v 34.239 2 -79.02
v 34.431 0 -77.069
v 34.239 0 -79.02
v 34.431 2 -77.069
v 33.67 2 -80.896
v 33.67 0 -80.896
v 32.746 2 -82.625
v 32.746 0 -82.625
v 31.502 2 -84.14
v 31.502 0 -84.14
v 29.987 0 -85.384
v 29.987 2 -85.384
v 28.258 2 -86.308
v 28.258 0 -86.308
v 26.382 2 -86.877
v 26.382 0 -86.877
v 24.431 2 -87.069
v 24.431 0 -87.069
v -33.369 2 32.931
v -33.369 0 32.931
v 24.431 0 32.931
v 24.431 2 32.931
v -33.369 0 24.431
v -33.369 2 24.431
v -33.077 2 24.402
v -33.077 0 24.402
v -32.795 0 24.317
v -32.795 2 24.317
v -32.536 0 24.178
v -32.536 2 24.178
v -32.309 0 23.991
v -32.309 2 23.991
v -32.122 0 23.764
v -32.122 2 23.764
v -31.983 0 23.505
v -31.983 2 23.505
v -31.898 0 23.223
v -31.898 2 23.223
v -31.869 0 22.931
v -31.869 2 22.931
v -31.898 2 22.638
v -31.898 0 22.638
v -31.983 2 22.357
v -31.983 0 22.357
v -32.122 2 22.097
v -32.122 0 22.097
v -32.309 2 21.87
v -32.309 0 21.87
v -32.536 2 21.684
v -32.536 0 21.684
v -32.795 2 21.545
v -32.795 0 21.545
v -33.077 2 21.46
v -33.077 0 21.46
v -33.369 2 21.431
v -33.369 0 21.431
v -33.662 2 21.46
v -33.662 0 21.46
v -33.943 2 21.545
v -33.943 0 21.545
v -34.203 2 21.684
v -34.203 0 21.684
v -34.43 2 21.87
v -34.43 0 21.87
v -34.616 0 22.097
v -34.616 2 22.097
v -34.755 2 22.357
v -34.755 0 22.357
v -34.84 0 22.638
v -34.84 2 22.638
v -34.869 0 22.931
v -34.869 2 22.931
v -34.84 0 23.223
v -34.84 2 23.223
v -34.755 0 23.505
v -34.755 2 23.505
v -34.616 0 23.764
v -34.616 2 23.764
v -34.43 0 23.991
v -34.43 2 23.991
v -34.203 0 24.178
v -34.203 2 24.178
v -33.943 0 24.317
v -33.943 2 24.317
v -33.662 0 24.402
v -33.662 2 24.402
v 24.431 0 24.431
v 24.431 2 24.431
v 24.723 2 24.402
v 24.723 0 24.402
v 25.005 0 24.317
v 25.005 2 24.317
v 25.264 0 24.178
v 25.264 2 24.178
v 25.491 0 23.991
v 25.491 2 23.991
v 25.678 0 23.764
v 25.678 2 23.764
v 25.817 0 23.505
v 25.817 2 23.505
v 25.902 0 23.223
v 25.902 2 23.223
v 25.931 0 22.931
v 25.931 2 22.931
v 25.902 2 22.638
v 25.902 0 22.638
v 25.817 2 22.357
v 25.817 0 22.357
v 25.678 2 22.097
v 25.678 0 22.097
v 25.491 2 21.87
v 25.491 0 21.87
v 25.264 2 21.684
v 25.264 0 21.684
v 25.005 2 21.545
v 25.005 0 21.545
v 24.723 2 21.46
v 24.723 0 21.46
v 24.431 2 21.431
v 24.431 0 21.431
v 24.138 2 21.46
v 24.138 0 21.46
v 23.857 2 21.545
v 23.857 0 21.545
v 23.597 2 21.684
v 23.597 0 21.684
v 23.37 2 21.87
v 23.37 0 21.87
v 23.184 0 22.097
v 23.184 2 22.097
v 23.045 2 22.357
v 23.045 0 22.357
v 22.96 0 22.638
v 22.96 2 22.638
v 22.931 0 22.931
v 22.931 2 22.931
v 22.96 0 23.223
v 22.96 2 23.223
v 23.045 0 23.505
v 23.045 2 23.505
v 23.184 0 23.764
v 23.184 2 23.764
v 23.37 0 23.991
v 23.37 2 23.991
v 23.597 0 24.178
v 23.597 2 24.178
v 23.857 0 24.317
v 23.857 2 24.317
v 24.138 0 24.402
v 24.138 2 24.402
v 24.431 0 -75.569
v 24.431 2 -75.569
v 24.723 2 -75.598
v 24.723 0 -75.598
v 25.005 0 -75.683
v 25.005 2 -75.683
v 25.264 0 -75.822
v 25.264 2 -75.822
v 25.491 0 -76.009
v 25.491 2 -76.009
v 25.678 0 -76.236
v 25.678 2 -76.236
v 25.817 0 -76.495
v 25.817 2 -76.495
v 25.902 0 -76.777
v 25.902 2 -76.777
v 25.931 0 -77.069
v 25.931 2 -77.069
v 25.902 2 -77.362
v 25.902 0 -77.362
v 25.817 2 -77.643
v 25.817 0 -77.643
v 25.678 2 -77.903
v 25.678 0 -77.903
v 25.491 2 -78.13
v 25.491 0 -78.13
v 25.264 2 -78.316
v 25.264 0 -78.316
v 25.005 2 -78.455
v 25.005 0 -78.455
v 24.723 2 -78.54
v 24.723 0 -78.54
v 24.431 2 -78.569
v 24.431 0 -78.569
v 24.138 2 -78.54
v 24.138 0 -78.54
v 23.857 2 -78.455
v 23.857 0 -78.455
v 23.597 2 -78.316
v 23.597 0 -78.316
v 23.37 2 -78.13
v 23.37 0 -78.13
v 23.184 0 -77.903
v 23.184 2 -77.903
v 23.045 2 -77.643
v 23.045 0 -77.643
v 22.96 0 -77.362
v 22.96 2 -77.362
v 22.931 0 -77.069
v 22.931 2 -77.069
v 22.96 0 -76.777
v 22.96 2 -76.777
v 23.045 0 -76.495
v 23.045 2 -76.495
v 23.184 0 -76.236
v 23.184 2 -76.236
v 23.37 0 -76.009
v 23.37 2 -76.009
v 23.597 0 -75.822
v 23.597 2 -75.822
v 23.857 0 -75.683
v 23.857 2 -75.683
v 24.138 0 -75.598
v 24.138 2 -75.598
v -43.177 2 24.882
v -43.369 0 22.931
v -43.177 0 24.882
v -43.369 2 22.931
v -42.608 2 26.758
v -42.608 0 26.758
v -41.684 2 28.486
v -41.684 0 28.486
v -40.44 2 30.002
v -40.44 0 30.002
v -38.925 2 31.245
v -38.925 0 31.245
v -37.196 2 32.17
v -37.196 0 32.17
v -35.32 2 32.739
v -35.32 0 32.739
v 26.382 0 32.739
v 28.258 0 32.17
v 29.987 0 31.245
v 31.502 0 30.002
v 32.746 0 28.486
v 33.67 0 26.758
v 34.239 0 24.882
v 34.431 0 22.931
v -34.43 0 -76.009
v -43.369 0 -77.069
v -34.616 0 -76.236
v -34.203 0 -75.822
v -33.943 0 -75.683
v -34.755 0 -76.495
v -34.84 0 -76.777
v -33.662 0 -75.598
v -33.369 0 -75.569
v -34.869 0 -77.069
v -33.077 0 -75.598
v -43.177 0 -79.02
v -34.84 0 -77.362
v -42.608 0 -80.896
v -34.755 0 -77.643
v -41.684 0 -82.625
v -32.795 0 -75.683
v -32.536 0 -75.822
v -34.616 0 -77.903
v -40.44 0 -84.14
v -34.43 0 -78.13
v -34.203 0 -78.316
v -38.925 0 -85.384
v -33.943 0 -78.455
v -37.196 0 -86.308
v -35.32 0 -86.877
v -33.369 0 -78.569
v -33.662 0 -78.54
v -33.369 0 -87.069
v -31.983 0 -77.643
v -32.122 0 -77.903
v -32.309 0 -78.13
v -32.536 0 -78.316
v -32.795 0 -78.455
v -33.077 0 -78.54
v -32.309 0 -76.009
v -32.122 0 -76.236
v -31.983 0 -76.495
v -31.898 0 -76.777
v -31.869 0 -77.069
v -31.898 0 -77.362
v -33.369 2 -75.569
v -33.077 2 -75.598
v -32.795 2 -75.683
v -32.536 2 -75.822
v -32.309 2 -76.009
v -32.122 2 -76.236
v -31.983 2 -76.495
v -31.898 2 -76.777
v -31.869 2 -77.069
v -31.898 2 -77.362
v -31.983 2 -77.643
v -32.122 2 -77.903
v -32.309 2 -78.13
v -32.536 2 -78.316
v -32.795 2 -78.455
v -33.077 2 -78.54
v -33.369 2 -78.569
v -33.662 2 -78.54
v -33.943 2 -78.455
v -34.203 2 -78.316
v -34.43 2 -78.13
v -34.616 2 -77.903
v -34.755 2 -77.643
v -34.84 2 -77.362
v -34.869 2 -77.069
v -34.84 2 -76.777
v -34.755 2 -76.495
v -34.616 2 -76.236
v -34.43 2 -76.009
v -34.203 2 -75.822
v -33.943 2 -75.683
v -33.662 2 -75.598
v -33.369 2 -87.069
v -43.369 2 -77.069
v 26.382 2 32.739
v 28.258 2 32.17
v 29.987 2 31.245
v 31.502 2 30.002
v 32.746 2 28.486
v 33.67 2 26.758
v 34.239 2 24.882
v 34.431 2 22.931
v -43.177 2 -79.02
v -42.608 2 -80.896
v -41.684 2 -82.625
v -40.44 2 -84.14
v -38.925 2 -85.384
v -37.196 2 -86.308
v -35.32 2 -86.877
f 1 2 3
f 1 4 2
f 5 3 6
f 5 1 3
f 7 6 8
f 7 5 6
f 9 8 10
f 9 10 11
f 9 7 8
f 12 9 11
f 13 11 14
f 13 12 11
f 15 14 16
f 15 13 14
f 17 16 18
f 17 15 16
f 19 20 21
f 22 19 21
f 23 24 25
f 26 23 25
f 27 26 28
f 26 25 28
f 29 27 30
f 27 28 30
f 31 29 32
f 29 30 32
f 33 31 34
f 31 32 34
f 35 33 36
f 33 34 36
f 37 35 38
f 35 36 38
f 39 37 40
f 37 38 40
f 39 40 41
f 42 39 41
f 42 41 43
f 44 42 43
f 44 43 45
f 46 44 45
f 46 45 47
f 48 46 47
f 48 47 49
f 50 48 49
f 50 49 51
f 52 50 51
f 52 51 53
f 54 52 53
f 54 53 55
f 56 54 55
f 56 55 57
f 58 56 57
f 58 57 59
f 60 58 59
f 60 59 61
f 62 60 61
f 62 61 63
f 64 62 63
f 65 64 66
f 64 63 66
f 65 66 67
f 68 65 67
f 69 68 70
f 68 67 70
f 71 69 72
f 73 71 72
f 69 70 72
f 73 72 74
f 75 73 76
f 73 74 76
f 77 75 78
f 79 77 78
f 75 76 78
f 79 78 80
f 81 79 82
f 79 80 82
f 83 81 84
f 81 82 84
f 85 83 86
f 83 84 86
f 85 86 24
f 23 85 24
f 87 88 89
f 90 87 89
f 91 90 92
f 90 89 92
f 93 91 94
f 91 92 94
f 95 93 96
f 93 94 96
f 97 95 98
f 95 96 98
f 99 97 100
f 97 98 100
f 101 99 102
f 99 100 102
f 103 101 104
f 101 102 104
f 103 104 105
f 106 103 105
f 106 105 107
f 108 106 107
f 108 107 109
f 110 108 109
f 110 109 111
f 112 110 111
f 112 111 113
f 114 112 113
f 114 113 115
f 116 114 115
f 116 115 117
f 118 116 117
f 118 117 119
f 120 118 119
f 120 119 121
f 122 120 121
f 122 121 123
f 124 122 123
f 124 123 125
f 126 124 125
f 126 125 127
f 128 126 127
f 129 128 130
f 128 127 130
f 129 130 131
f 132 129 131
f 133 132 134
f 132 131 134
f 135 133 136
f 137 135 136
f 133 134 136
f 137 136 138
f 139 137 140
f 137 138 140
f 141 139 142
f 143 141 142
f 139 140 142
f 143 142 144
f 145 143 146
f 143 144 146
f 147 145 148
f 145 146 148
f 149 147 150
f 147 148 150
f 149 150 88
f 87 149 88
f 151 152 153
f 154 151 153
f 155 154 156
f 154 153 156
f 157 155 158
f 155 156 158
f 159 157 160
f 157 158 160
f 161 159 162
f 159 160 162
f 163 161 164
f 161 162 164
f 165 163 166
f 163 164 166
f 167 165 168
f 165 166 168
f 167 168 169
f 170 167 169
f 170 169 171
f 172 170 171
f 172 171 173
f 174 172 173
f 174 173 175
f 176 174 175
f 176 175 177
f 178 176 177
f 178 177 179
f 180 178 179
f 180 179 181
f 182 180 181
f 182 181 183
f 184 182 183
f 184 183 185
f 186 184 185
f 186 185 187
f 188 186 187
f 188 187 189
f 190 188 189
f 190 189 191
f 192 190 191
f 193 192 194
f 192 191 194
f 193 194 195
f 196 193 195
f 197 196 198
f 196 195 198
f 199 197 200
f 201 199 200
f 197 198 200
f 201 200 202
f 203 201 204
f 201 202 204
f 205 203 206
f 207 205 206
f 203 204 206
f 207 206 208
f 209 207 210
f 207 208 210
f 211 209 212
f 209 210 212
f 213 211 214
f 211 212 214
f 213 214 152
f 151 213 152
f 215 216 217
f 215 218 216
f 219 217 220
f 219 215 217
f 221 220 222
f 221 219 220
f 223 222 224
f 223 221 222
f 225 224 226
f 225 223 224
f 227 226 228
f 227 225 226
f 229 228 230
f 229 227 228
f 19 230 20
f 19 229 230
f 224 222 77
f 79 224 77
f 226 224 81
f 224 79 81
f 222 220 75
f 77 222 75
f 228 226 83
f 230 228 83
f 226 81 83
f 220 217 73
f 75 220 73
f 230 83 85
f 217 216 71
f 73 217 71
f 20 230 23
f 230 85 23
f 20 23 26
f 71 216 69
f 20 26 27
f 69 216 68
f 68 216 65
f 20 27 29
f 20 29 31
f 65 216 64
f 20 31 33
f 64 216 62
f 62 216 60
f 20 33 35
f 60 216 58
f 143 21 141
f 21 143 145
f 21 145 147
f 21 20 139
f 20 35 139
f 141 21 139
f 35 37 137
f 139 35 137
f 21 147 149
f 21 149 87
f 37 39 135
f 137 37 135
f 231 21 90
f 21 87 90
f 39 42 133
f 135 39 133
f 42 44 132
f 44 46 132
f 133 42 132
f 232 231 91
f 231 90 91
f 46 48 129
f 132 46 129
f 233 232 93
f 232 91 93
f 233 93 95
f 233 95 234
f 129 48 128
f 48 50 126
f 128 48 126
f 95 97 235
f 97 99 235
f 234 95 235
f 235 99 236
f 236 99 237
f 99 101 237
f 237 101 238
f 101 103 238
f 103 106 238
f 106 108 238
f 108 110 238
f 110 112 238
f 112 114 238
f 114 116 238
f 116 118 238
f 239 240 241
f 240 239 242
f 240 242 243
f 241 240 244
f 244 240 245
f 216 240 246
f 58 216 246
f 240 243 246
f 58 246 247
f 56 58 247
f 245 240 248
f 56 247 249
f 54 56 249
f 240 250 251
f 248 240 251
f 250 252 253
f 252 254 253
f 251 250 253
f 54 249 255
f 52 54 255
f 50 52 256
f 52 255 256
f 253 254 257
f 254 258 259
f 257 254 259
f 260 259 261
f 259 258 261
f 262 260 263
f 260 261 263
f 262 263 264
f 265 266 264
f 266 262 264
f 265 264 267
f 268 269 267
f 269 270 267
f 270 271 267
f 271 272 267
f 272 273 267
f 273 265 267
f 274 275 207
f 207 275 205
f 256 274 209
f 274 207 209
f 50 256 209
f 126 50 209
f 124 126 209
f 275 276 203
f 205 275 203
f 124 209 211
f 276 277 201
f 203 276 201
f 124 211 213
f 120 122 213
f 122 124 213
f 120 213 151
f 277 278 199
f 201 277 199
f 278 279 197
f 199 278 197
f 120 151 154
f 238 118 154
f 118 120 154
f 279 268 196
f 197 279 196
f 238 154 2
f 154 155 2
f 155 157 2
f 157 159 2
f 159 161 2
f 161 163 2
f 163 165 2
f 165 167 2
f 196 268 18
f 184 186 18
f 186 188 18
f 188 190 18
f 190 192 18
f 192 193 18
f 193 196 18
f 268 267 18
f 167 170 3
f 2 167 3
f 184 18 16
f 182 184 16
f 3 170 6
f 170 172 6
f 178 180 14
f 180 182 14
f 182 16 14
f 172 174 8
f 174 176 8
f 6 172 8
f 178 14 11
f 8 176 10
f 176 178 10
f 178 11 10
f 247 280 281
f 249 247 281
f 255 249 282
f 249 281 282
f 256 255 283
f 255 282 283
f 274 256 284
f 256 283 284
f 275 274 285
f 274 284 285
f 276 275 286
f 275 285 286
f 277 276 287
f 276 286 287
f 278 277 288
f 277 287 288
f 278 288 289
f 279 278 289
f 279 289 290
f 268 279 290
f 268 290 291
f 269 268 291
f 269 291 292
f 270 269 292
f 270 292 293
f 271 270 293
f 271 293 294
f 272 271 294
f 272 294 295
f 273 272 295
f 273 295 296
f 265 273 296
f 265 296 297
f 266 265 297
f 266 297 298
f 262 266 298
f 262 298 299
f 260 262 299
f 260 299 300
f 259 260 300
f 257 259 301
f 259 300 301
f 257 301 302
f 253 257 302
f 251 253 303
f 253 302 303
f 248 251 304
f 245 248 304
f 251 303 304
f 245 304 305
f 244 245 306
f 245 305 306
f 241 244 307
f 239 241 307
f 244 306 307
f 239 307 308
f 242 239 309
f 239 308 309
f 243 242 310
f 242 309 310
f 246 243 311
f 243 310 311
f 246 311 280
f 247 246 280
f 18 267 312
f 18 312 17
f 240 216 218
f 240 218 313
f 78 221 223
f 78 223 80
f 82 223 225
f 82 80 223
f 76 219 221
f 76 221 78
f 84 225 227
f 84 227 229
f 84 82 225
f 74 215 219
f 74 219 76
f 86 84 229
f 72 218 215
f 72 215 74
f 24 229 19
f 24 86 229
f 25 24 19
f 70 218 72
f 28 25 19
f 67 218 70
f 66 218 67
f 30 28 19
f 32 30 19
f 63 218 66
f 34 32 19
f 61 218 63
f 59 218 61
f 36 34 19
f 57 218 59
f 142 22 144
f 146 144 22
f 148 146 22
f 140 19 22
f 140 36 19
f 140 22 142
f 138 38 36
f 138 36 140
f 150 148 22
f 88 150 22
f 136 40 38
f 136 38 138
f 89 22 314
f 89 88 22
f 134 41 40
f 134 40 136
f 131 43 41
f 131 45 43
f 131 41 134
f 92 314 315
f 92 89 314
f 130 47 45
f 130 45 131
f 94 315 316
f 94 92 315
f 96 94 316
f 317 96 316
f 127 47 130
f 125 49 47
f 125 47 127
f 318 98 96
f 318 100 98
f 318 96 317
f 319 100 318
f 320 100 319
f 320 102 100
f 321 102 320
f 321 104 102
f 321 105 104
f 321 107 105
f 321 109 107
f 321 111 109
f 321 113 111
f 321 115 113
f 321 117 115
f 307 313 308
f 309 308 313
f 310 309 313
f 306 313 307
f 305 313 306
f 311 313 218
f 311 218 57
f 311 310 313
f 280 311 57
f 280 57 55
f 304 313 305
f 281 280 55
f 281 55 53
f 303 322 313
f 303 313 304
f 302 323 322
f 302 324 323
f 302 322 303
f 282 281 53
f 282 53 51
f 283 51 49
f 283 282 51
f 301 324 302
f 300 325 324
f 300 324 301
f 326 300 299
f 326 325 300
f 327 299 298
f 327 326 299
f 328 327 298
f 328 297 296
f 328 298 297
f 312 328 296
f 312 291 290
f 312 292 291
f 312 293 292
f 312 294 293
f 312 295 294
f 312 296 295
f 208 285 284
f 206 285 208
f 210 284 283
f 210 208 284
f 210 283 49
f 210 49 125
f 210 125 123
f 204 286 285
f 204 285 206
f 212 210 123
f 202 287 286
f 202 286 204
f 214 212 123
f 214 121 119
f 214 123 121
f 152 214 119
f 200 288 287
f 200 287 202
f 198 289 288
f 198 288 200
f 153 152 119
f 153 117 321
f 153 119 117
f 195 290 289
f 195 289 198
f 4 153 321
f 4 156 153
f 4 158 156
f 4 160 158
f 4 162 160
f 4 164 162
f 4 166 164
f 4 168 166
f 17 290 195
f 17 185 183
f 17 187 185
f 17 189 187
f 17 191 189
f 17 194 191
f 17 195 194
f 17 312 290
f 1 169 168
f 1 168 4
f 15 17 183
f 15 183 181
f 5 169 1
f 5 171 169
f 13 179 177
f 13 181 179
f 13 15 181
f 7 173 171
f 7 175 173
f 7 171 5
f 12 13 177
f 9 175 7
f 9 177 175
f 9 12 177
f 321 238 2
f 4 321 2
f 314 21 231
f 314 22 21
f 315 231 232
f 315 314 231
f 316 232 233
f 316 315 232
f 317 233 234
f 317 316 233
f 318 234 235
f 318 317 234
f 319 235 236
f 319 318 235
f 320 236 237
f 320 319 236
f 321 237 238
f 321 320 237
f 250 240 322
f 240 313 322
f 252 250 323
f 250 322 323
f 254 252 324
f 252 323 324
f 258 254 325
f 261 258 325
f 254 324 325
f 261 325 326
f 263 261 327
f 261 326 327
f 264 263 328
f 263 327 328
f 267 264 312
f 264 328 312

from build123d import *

# Parameters (mm, degrees)
SKETCH1_W           = 77.8
SKETCH1_H           = 120
BOSS_EXTRUDE1_DEPTH = 2
FILLET1_R           = 10
SKETCH2_R           = 1.5
CUT_EXTRUDE1_DEPTH  = 21


with BuildPart() as part:
    # Sketch1 → Boss-Extrude1 (new body)
    with BuildSketch(Plane(origin=(0, 0, 0), x_dir=(1, 0, 0), z_dir=(0, 1, 0))):
        with Locations((-4.469169002, 27.069255629)):
            Rectangle(SKETCH1_W, SKETCH1_H)
    extrude(amount=BOSS_EXTRUDE1_DEPTH)

    # Fillet1
    fillet1_edges = [part.edges().sort_by_distance(p)[0] for p in [
        (-43.369169002, 1, -87.069255629),
        (34.430830998, 1, -87.069255629),
        (34.430830998, 1, 32.930744371),
        (-43.369169002, 1, 32.930744371),
    ]]
    fillet(fillet1_edges, radius=FILLET1_R)

    # Sketch2 → Cut-Extrude1 (cut)
    with BuildSketch(Plane(origin=(0, 2, 0), x_dir=(1, 0, 0), z_dir=(0, 1, 0))):
        with Locations(Location((-33.369169002, -22.930744371, 0), (0, 0, 270))):
            Circle(SKETCH2_R)
        with Locations(Location((24.430830998, -22.930744371, 0), (0, 0, 270))):
            Circle(SKETCH2_R)
        with Locations(Location((-33.369169002, 77.069255629, 0), (0, 0, 270))):
            Circle(SKETCH2_R)
        with Locations(Location((24.430830998, 77.069255629, 0), (0, 0, 270))):
            Circle(SKETCH2_R)
    extrude(amount=-CUT_EXTRUDE1_DEPTH, mode=Mode.SUBTRACT)


solid = part.part
